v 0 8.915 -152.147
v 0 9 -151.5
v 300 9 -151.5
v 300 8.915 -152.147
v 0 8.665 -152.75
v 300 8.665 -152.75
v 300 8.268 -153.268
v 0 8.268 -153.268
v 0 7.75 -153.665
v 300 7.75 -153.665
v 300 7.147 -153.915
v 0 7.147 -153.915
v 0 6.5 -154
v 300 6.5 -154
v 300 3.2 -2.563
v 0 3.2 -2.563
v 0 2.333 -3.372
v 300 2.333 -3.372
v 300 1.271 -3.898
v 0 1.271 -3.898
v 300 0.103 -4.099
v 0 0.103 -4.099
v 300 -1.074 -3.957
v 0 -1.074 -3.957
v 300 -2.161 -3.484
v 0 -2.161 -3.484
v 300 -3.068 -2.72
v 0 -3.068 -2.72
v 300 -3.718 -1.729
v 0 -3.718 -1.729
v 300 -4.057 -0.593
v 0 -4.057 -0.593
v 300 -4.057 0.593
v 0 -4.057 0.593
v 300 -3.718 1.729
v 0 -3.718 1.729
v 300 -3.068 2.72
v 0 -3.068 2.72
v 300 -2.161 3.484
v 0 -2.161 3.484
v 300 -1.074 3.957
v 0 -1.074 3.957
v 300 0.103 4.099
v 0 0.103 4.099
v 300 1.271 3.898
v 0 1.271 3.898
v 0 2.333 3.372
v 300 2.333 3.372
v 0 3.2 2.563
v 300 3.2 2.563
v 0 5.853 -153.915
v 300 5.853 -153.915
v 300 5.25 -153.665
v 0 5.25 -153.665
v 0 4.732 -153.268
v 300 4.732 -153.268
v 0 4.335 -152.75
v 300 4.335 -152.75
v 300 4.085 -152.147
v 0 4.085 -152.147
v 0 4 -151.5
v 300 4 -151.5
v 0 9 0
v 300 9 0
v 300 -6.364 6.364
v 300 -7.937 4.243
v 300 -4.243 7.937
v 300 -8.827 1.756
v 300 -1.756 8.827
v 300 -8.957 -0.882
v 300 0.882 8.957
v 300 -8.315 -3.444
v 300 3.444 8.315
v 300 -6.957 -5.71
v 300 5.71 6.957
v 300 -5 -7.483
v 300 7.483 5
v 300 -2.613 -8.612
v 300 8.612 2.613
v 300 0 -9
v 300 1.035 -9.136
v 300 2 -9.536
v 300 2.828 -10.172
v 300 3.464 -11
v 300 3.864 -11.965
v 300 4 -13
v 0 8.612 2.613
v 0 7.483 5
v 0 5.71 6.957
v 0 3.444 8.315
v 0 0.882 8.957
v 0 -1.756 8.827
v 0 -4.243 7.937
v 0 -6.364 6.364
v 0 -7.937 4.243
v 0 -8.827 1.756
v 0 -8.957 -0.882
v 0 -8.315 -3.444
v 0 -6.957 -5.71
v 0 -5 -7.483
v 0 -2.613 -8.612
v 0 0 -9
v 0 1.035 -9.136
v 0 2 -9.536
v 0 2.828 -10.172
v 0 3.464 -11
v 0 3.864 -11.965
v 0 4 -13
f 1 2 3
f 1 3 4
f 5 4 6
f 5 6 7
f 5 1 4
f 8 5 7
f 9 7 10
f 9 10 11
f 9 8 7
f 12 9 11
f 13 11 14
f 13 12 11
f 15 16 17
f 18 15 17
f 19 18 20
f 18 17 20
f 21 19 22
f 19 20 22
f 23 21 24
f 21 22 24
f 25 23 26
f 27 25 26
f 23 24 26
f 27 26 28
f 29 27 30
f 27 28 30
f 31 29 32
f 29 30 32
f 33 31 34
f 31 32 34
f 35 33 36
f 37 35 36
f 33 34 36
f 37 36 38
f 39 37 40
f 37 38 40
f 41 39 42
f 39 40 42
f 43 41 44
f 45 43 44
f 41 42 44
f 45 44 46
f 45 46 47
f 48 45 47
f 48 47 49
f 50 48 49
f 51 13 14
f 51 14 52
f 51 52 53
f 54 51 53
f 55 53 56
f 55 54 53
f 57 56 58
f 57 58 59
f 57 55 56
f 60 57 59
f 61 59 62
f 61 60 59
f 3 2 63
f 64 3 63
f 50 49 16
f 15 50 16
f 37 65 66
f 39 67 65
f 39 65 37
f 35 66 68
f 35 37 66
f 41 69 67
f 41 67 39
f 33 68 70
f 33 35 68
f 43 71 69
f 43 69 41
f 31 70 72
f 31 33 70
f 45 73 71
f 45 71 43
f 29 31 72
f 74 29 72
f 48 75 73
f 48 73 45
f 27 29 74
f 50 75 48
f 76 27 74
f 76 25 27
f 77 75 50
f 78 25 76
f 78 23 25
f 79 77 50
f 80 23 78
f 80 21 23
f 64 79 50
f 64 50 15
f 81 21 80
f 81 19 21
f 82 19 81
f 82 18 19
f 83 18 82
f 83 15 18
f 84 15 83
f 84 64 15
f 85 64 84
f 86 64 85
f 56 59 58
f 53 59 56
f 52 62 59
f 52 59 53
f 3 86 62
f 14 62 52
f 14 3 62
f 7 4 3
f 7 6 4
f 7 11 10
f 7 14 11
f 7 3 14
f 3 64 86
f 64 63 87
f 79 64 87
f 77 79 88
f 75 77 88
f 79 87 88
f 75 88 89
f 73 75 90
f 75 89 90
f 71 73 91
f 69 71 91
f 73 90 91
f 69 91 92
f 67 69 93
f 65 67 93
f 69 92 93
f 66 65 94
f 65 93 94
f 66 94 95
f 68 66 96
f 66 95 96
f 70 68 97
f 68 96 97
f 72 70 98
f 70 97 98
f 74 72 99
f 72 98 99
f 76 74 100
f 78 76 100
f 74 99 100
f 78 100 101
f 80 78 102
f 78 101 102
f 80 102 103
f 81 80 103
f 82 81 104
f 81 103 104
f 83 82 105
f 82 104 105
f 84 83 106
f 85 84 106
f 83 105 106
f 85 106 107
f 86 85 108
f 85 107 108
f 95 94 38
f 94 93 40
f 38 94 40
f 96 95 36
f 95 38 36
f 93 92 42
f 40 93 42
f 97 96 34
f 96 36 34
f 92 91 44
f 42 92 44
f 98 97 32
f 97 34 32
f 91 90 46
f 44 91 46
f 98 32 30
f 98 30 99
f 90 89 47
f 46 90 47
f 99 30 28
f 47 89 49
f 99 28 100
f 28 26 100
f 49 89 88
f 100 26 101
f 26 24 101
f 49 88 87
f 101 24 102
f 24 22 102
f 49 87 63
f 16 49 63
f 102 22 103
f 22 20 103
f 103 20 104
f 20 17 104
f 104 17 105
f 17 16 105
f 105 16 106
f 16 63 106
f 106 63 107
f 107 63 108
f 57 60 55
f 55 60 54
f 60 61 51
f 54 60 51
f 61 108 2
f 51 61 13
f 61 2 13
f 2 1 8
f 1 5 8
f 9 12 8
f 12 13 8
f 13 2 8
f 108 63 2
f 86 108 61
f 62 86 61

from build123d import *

# Parameters (mm, degrees)
SKETCH1_R               = 9
BOSS_EXTRUDE1_DEPTH     = 300
CUT_EXTRUDE1_DEPTH      = 301.269878609
CUT_EXTRUDE1_DEPTH_BACK = 301.269878609
BOSS_EXTRUDE2_START     = -300
BOSS_EXTRUDE2_DEPTH     = 300
CUT_EXTRUDE2_START      = -300
CUT_EXTRUDE2_DEPTH      = 300


# Read off the part's stored shape, not the designer's step: Cut-Extrude2
with BuildPart() as part:
    # Sketch1 → Boss-Extrude1 (new body)
    with BuildSketch(Plane(origin=(0, 0, 0), x_dir=(0, 0, -1), z_dir=(1, 0, 0))):
        Circle(SKETCH1_R)
    extrude(amount=BOSS_EXTRUDE1_DEPTH)

    # Sketch2 → Cut-Extrude1 (cut, two sides: drawn at the far end of the back side and taken through both)
    with BuildSketch(Plane(origin=(300, 0, 0), x_dir=(0, 0, -1), z_dir=(1, 0, 0)).offset(-CUT_EXTRUDE1_DEPTH_BACK)):
        with BuildLine():
            Line((-2.563201124, 3.2), (2.563201124, 3.2))
            ThreePointArc((2.563201124, 3.2), (0, -4.1), (-2.563201124, 3.2))
        make_face()
    extrude(amount=CUT_EXTRUDE1_DEPTH + CUT_EXTRUDE1_DEPTH_BACK, mode=Mode.SUBTRACT)

    # Sketch3 → Boss-Extrude2 (add)
    with BuildSketch(Plane(origin=(300, 0, 0), x_dir=(0, 0, -1), z_dir=(1, 0, 0)).offset(BOSS_EXTRUDE2_START)):
        with BuildLine():
            ThreePointArc((8.062257748, 4), (8.762428879, 2.054224947), (9, 0))
            ThreePointArc((9, 0), (10.171572875, 2.828427125), (13, 4))
            Line((13, 4), (8.062257748, 4))
        make_face()
        with BuildLine():
            ThreePointArc((5, 4), (7.828427125, 2.828427125), (9, 0))
            ThreePointArc((9, 0), (8.762428879, 2.054224947), (8.062257748, 4))
            Line((8.062257748, 4), (5, 4))
        make_face()
        with BuildLine():
            Line((154, 9), (0, 9))
            ThreePointArc((0, 9), (4.74341649, 7.64852927), (8.062257748, 4))
            Line((8.062257748, 4), (13, 4))
            Line((13, 4), (154, 4))
            Line((154, 4), (154, 9))
        make_face()
        with BuildLine():
            ThreePointArc((8.062257748, 4), (4.74341649, 7.64852927), (0, 9))
            Line((0, 9), (0, 4))
            Line((0, 4), (5, 4))
            Line((5, 4), (8.062257748, 4))
        make_face()
    extrude(amount=BOSS_EXTRUDE2_DEPTH)

    # Cut-Extrude2 outline → Cut-Extrude2 (cut)
    with BuildSketch(Plane(origin=(300, 0, 0), x_dir=(0, 0, -1), z_dir=(1, 0, 0)).offset(CUT_EXTRUDE2_START)):
        with BuildLine():
            ThreePointArc((151.5, 9), (153.267766953, 8.267766953), (154, 6.5))
            Line((154, 6.5), (154, 9))
            Line((154, 9), (151.5, 9))
        make_face()
        with BuildLine():
            ThreePointArc((154, 6.5), (153.267766953, 4.732233047), (151.5, 4))
            Line((151.5, 4), (154, 4))
            Line((154, 4), (154, 6.5))
        make_face()
    extrude(amount=CUT_EXTRUDE2_DEPTH, mode=Mode.SUBTRACT)


solid = part.part
